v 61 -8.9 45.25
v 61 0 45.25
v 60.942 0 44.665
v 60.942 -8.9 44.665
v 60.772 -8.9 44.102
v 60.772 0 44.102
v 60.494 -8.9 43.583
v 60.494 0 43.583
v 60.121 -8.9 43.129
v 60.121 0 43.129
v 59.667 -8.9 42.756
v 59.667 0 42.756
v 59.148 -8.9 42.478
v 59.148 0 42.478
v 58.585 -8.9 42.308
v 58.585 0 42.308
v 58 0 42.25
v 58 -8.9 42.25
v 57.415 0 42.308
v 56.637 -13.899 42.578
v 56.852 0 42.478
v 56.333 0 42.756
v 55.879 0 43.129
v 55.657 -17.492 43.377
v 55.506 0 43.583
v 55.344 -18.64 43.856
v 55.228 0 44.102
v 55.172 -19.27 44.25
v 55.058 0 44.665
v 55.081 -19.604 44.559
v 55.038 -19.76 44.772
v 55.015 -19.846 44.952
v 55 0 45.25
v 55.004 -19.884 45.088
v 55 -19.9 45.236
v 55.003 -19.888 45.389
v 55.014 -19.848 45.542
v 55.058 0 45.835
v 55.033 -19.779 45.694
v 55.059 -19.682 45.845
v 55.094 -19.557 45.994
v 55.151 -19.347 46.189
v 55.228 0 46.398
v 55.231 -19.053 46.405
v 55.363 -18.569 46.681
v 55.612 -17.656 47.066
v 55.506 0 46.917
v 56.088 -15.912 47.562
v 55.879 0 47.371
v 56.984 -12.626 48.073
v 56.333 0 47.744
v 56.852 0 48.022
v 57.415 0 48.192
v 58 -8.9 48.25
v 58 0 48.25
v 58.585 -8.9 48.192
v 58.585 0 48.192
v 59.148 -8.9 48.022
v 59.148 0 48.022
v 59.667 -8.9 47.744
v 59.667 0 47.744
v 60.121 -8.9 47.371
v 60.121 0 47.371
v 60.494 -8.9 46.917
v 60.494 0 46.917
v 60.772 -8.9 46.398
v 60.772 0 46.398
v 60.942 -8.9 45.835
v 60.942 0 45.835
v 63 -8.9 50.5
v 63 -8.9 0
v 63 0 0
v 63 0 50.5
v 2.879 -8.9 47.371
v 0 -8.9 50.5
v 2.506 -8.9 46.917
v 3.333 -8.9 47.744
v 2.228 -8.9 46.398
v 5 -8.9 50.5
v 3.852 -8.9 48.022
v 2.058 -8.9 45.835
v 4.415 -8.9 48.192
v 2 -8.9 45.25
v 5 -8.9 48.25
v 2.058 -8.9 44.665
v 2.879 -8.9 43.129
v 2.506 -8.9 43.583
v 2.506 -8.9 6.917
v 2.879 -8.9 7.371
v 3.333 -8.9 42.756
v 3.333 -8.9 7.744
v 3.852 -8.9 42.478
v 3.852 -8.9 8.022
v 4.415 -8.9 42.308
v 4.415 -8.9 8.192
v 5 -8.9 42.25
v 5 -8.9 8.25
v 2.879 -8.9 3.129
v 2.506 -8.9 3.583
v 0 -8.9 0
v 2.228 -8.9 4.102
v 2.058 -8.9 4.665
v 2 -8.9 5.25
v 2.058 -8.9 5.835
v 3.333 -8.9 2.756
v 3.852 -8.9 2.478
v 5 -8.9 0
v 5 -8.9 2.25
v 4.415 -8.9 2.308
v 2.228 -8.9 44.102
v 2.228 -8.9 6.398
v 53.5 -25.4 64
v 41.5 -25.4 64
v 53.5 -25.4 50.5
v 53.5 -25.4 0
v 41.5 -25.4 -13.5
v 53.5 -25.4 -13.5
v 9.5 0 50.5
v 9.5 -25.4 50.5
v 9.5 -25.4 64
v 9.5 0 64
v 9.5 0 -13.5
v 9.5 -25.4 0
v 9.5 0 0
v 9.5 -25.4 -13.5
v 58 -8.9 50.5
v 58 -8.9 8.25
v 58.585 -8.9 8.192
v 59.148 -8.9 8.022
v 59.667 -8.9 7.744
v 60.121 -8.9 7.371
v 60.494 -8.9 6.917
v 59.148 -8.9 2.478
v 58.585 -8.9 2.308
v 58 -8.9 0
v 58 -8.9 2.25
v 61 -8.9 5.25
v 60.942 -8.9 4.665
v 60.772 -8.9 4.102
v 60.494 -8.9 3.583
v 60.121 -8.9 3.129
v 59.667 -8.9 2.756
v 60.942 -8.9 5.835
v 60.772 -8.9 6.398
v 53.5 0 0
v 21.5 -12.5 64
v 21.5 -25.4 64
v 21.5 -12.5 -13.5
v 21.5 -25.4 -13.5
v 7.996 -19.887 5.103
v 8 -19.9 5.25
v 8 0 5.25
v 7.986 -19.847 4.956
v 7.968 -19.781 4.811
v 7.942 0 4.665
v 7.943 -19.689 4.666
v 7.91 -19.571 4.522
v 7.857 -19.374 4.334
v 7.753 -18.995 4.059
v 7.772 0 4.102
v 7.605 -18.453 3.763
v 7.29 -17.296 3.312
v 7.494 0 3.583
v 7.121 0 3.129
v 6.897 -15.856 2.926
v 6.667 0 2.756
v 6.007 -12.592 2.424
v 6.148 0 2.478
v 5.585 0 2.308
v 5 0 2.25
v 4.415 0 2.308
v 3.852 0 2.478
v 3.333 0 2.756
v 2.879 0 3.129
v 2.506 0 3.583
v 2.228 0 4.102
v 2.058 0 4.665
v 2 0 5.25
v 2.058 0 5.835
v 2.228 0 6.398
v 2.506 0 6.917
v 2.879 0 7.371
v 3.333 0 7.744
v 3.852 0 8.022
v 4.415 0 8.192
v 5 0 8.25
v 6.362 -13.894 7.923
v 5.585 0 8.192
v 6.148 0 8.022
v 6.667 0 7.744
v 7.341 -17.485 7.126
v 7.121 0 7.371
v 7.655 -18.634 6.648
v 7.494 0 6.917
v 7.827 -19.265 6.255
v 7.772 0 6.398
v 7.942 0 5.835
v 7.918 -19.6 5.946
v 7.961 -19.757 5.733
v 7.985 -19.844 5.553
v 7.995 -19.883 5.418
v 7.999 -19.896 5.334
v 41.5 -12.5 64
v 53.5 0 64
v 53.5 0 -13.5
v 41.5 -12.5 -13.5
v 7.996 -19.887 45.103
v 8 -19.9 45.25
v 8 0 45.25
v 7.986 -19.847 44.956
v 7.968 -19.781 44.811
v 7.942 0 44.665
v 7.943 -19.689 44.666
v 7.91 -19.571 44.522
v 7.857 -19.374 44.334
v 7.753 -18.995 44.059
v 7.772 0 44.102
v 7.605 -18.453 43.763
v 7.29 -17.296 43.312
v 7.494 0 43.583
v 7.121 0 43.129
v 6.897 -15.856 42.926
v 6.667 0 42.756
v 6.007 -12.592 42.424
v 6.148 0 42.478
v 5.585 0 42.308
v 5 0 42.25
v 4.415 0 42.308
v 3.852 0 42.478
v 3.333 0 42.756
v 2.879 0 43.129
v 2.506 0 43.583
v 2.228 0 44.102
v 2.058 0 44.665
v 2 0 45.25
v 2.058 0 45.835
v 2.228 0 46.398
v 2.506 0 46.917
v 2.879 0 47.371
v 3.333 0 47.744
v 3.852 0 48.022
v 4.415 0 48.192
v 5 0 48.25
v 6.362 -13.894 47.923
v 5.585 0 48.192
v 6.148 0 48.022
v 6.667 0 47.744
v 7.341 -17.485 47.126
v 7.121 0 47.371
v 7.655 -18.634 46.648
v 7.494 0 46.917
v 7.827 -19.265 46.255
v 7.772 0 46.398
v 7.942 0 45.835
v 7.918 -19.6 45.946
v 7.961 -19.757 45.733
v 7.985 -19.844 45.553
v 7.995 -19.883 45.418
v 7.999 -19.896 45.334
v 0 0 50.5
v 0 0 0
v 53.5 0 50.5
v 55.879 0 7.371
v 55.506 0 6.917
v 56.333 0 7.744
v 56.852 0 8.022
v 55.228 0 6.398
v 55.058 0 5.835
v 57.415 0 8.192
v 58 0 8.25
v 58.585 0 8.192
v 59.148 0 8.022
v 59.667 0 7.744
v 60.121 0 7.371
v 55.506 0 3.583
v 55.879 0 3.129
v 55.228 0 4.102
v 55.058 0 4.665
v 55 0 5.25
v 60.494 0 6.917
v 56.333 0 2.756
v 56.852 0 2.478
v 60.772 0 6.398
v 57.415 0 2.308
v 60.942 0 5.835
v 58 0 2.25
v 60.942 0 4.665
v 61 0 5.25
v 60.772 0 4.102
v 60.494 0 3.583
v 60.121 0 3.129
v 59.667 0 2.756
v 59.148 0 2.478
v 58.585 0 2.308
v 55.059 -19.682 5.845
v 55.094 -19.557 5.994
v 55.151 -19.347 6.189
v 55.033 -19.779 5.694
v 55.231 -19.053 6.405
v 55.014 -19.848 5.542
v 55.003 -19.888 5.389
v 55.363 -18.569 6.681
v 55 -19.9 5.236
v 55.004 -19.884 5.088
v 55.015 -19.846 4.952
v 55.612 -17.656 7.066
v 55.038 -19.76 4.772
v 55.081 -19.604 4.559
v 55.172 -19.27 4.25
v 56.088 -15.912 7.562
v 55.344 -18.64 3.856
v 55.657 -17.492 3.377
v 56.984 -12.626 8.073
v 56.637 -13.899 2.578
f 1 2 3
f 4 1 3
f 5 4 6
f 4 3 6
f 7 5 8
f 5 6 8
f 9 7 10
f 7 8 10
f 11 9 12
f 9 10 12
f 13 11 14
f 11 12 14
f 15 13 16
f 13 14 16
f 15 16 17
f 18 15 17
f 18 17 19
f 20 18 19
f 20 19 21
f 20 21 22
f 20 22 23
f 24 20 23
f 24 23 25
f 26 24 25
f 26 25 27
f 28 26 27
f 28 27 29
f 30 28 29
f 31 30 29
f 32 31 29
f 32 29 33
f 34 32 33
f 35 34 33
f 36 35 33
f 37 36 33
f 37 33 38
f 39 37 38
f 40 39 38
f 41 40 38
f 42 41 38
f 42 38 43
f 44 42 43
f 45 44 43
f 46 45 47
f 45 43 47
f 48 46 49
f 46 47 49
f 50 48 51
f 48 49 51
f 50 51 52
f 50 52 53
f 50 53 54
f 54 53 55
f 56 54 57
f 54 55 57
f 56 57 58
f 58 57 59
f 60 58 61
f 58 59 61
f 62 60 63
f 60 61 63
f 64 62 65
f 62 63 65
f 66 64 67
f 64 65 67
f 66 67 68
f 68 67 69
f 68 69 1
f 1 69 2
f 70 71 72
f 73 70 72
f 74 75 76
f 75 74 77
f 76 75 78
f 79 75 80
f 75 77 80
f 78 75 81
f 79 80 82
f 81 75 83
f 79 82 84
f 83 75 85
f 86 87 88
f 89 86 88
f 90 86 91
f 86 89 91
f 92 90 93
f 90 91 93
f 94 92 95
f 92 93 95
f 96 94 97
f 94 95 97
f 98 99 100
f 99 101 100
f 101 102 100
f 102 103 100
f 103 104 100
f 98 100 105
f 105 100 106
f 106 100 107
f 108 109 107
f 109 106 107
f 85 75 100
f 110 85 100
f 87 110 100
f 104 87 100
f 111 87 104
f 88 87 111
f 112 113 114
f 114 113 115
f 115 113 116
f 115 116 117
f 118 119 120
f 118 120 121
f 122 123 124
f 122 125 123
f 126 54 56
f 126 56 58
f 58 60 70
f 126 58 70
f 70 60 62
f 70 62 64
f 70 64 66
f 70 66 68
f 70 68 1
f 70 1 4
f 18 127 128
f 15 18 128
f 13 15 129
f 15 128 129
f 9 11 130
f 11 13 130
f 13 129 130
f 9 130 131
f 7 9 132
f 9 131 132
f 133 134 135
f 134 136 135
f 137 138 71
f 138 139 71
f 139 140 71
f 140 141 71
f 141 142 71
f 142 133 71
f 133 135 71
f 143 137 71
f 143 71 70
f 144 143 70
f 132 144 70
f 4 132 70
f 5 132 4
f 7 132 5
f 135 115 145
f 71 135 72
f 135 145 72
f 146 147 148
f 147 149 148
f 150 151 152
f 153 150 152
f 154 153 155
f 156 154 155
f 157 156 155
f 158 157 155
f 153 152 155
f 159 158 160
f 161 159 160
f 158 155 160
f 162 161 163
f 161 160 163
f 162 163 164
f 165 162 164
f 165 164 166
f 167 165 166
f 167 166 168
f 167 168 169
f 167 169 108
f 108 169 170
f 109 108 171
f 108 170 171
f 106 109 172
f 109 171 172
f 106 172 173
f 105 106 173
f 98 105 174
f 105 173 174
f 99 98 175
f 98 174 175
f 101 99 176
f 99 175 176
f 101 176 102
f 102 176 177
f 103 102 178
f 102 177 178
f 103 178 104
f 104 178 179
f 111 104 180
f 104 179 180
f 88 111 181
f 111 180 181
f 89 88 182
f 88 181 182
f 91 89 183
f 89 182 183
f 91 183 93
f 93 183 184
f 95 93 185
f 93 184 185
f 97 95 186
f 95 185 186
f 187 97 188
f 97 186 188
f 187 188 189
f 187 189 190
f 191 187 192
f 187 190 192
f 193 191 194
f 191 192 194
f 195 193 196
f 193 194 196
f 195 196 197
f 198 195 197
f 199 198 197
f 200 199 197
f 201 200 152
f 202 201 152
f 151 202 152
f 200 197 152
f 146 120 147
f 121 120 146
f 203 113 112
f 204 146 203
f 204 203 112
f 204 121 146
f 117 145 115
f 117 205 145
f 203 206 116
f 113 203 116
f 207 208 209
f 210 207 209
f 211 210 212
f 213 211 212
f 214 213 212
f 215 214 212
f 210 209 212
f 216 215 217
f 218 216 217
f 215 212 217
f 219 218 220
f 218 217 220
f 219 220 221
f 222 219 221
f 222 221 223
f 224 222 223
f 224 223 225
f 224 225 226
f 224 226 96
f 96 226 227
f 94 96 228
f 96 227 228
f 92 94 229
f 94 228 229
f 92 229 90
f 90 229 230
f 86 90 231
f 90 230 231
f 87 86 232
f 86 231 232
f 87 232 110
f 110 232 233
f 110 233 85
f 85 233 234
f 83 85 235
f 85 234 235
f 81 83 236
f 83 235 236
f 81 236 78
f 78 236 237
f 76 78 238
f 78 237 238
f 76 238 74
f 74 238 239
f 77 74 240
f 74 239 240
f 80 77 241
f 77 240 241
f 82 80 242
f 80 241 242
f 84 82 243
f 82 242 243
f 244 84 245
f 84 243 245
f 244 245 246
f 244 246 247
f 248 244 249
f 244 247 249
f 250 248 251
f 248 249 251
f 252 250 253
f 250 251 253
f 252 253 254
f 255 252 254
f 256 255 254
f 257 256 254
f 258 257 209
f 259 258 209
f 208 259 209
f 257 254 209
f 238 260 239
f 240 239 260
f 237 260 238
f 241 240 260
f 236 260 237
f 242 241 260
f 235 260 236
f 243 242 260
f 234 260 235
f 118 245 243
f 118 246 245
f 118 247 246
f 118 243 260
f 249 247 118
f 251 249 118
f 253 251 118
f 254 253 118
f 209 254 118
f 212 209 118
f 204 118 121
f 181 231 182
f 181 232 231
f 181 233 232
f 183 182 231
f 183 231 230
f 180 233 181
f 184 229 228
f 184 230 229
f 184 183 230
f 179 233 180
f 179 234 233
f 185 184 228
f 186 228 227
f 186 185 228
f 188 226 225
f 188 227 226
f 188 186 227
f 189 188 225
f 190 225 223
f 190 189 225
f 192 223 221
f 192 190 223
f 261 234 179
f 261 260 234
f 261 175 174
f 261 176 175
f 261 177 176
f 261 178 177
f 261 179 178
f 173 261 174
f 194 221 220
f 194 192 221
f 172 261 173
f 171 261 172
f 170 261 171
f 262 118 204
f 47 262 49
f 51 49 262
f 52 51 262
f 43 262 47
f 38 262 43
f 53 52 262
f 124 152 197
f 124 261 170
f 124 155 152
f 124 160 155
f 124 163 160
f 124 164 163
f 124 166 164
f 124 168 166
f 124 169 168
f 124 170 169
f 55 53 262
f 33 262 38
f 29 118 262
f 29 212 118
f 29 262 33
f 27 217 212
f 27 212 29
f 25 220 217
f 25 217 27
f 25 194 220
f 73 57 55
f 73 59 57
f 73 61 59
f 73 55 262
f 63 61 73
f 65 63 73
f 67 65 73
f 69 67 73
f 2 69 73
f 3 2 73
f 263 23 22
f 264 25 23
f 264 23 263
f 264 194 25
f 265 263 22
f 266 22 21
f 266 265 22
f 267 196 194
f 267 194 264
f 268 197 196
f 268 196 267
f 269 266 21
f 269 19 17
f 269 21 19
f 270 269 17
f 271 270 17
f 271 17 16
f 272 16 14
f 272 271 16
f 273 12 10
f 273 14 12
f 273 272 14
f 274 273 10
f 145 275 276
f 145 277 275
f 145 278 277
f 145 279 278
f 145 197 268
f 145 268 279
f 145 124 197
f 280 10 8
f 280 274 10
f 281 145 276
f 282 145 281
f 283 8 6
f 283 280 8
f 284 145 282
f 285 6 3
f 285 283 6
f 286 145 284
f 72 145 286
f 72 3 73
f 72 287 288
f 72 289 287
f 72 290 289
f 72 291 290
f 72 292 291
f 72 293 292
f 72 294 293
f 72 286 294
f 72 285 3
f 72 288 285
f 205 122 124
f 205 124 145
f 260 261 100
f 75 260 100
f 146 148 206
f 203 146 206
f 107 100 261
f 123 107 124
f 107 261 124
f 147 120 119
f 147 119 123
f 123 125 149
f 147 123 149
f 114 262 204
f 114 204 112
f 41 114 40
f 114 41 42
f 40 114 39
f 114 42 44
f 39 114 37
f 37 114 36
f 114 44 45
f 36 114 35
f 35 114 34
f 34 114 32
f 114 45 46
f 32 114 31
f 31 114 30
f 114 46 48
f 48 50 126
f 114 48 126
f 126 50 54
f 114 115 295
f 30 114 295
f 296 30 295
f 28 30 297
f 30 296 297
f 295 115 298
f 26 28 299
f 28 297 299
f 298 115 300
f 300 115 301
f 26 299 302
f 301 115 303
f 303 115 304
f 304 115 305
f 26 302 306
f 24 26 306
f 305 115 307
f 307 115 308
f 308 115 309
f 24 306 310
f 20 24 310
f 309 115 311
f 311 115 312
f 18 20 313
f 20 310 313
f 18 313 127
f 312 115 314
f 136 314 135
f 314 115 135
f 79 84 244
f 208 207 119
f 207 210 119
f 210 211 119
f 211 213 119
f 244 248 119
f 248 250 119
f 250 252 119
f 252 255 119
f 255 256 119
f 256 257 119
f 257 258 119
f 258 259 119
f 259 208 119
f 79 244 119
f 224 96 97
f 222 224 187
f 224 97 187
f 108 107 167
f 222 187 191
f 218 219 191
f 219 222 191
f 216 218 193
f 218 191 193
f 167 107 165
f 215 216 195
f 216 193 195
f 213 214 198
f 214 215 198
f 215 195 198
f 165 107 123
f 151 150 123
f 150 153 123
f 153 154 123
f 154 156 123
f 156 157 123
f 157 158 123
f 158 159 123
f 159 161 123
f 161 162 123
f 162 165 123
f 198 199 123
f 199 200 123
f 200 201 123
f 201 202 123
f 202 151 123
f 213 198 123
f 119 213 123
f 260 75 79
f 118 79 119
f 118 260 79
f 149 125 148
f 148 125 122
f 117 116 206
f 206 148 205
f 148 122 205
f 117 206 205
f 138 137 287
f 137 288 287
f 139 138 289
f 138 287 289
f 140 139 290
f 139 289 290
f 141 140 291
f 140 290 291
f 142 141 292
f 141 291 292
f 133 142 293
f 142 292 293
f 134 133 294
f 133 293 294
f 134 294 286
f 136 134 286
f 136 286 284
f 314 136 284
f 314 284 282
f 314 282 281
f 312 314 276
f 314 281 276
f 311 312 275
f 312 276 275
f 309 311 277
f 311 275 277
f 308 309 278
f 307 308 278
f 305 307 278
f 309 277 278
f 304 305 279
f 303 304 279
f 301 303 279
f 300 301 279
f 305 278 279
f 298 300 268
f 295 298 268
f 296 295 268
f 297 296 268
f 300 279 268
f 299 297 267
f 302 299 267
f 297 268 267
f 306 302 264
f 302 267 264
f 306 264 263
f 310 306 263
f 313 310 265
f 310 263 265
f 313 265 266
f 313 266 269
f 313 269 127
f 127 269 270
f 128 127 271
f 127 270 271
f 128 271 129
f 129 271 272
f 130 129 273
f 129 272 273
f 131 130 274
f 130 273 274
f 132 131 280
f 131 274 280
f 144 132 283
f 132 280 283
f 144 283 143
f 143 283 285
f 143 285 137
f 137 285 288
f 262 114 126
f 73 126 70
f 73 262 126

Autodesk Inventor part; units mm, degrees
ref_plane "YZ Plane" through (0, 0, 0) normal (1, 0, 0) x (0, 1, 0)
ref_plane "XZ Plane" through (0, 0, 0) normal (0, 1, 0) x (-1, 0, 0)
ref_plane "XY Plane" through (0, 0, 0) normal (0, 0, 1) x (1, 0, 0)
sketch "Sketch1" plane through (0, 0, 0) normal (0, 0, 1) x (1, 0, 0)
  line L0 (0, 0) -> (63, 0)
  line L1 (53.5, -25.4) -> (41.5, -25.4)
  line L2 (41.5, -25.4) -> (41.5, -12.5)
  line L3 (41.5, -12.5) -> (21.5, -12.5)
  line L4 (21.5, -12.5) -> (21.5, -25.4)
  line L5 (0, 0) -> (0, -8.9)
  line L6 (0, -8.9) -> (5, -8.9)
  line L7 (5, -8.9) -> (9.5, -25.4)
  line L8 (9.5, -25.4) -> (21.5, -25.4)
  line L9 (53.5, -25.4) -> (58, -8.9)
  line L10 (58, -8.9) -> (63, -8.9)
  line L11 (63, -8.9) -> (63, 0)
  point P0 (31.5, -12.5)
  point P1 (31.5, 0)
  dimension "d0" = 63
  dimension "d1" = 25.4
  dimension "d4" = 21.5
  dimension "d5" = 8.9
  dimension "d6" = 12.9
  dimension "d7" = 12
  dimension "d8" = 5
extrude "Extrusion1" add sketch "Sketch1" along normal blind 50.5
sketch "Sketch2" plane through (0, 0, 50.5) normal (0, 0, 1) x (1, 0, 0)
  line L0 (21.5, -25.4) -> (21.5, -12.5) projected
  line L1 (41.5, -12.5) -> (41.5, -25.4) projected
  line L2 (9.5, -25.4) -> (21.5, -25.4) projected
  line L3 (41.5, -25.4) -> (53.5, -25.4) projected
  line L4 (9.5, -25.4) -> (9.5, 0)
  line L5 (9.5, 0) -> (53.5, 0)
  line L6 (53.5, 0) -> (53.5, -25.4)
  line L7 (21.5, -12.5) -> (41.5, -12.5) projected
  point P0 (0, 0)
  point P1 (31.5, 0)
extrude "Extrusion2" add sketch "Sketch2" along normal blind 13.5 and the other way blind 64
sketch "Sketch3" plane through (63, 0, 50.5) normal (0, 1, 0) x (1, 0, 0)
  circle A0 centre (-58, 5.25) radius 3
  circle A1 centre (-58, 45.25) radius 3
  circle A2 centre (-5, 5.25) radius 3
  circle A3 centre (-5, 45.25) radius 3
  line L0 (-58, 5.25) -> (-5, 5.25) construction
  line L1 (-5, 5.25) -> (-5, 45.25) construction
  line L2 (-5, 45.25) -> (-58, 45.25) construction
  line L3 (-58, 45.25) -> (-58, 5.25) construction
  line L4 (-53.5, 64) -> (-9.5, 64) projected
  line L5 (-63, 50.5) -> (-63, 0) projected
  point P0 (-31.5, 64)
  point P1 (-31.5, 45.25)
  point P2 (-58, 25.25)
  point P3 (-63, 25.25)
  dimension "d15" = 6
  dimension "d16" = 40
  dimension "d17" = 53
extrude "Extrusion3" cut sketch "Sketch3" against normal blind 34.5
properties part number "HGW20CC_Slider"
